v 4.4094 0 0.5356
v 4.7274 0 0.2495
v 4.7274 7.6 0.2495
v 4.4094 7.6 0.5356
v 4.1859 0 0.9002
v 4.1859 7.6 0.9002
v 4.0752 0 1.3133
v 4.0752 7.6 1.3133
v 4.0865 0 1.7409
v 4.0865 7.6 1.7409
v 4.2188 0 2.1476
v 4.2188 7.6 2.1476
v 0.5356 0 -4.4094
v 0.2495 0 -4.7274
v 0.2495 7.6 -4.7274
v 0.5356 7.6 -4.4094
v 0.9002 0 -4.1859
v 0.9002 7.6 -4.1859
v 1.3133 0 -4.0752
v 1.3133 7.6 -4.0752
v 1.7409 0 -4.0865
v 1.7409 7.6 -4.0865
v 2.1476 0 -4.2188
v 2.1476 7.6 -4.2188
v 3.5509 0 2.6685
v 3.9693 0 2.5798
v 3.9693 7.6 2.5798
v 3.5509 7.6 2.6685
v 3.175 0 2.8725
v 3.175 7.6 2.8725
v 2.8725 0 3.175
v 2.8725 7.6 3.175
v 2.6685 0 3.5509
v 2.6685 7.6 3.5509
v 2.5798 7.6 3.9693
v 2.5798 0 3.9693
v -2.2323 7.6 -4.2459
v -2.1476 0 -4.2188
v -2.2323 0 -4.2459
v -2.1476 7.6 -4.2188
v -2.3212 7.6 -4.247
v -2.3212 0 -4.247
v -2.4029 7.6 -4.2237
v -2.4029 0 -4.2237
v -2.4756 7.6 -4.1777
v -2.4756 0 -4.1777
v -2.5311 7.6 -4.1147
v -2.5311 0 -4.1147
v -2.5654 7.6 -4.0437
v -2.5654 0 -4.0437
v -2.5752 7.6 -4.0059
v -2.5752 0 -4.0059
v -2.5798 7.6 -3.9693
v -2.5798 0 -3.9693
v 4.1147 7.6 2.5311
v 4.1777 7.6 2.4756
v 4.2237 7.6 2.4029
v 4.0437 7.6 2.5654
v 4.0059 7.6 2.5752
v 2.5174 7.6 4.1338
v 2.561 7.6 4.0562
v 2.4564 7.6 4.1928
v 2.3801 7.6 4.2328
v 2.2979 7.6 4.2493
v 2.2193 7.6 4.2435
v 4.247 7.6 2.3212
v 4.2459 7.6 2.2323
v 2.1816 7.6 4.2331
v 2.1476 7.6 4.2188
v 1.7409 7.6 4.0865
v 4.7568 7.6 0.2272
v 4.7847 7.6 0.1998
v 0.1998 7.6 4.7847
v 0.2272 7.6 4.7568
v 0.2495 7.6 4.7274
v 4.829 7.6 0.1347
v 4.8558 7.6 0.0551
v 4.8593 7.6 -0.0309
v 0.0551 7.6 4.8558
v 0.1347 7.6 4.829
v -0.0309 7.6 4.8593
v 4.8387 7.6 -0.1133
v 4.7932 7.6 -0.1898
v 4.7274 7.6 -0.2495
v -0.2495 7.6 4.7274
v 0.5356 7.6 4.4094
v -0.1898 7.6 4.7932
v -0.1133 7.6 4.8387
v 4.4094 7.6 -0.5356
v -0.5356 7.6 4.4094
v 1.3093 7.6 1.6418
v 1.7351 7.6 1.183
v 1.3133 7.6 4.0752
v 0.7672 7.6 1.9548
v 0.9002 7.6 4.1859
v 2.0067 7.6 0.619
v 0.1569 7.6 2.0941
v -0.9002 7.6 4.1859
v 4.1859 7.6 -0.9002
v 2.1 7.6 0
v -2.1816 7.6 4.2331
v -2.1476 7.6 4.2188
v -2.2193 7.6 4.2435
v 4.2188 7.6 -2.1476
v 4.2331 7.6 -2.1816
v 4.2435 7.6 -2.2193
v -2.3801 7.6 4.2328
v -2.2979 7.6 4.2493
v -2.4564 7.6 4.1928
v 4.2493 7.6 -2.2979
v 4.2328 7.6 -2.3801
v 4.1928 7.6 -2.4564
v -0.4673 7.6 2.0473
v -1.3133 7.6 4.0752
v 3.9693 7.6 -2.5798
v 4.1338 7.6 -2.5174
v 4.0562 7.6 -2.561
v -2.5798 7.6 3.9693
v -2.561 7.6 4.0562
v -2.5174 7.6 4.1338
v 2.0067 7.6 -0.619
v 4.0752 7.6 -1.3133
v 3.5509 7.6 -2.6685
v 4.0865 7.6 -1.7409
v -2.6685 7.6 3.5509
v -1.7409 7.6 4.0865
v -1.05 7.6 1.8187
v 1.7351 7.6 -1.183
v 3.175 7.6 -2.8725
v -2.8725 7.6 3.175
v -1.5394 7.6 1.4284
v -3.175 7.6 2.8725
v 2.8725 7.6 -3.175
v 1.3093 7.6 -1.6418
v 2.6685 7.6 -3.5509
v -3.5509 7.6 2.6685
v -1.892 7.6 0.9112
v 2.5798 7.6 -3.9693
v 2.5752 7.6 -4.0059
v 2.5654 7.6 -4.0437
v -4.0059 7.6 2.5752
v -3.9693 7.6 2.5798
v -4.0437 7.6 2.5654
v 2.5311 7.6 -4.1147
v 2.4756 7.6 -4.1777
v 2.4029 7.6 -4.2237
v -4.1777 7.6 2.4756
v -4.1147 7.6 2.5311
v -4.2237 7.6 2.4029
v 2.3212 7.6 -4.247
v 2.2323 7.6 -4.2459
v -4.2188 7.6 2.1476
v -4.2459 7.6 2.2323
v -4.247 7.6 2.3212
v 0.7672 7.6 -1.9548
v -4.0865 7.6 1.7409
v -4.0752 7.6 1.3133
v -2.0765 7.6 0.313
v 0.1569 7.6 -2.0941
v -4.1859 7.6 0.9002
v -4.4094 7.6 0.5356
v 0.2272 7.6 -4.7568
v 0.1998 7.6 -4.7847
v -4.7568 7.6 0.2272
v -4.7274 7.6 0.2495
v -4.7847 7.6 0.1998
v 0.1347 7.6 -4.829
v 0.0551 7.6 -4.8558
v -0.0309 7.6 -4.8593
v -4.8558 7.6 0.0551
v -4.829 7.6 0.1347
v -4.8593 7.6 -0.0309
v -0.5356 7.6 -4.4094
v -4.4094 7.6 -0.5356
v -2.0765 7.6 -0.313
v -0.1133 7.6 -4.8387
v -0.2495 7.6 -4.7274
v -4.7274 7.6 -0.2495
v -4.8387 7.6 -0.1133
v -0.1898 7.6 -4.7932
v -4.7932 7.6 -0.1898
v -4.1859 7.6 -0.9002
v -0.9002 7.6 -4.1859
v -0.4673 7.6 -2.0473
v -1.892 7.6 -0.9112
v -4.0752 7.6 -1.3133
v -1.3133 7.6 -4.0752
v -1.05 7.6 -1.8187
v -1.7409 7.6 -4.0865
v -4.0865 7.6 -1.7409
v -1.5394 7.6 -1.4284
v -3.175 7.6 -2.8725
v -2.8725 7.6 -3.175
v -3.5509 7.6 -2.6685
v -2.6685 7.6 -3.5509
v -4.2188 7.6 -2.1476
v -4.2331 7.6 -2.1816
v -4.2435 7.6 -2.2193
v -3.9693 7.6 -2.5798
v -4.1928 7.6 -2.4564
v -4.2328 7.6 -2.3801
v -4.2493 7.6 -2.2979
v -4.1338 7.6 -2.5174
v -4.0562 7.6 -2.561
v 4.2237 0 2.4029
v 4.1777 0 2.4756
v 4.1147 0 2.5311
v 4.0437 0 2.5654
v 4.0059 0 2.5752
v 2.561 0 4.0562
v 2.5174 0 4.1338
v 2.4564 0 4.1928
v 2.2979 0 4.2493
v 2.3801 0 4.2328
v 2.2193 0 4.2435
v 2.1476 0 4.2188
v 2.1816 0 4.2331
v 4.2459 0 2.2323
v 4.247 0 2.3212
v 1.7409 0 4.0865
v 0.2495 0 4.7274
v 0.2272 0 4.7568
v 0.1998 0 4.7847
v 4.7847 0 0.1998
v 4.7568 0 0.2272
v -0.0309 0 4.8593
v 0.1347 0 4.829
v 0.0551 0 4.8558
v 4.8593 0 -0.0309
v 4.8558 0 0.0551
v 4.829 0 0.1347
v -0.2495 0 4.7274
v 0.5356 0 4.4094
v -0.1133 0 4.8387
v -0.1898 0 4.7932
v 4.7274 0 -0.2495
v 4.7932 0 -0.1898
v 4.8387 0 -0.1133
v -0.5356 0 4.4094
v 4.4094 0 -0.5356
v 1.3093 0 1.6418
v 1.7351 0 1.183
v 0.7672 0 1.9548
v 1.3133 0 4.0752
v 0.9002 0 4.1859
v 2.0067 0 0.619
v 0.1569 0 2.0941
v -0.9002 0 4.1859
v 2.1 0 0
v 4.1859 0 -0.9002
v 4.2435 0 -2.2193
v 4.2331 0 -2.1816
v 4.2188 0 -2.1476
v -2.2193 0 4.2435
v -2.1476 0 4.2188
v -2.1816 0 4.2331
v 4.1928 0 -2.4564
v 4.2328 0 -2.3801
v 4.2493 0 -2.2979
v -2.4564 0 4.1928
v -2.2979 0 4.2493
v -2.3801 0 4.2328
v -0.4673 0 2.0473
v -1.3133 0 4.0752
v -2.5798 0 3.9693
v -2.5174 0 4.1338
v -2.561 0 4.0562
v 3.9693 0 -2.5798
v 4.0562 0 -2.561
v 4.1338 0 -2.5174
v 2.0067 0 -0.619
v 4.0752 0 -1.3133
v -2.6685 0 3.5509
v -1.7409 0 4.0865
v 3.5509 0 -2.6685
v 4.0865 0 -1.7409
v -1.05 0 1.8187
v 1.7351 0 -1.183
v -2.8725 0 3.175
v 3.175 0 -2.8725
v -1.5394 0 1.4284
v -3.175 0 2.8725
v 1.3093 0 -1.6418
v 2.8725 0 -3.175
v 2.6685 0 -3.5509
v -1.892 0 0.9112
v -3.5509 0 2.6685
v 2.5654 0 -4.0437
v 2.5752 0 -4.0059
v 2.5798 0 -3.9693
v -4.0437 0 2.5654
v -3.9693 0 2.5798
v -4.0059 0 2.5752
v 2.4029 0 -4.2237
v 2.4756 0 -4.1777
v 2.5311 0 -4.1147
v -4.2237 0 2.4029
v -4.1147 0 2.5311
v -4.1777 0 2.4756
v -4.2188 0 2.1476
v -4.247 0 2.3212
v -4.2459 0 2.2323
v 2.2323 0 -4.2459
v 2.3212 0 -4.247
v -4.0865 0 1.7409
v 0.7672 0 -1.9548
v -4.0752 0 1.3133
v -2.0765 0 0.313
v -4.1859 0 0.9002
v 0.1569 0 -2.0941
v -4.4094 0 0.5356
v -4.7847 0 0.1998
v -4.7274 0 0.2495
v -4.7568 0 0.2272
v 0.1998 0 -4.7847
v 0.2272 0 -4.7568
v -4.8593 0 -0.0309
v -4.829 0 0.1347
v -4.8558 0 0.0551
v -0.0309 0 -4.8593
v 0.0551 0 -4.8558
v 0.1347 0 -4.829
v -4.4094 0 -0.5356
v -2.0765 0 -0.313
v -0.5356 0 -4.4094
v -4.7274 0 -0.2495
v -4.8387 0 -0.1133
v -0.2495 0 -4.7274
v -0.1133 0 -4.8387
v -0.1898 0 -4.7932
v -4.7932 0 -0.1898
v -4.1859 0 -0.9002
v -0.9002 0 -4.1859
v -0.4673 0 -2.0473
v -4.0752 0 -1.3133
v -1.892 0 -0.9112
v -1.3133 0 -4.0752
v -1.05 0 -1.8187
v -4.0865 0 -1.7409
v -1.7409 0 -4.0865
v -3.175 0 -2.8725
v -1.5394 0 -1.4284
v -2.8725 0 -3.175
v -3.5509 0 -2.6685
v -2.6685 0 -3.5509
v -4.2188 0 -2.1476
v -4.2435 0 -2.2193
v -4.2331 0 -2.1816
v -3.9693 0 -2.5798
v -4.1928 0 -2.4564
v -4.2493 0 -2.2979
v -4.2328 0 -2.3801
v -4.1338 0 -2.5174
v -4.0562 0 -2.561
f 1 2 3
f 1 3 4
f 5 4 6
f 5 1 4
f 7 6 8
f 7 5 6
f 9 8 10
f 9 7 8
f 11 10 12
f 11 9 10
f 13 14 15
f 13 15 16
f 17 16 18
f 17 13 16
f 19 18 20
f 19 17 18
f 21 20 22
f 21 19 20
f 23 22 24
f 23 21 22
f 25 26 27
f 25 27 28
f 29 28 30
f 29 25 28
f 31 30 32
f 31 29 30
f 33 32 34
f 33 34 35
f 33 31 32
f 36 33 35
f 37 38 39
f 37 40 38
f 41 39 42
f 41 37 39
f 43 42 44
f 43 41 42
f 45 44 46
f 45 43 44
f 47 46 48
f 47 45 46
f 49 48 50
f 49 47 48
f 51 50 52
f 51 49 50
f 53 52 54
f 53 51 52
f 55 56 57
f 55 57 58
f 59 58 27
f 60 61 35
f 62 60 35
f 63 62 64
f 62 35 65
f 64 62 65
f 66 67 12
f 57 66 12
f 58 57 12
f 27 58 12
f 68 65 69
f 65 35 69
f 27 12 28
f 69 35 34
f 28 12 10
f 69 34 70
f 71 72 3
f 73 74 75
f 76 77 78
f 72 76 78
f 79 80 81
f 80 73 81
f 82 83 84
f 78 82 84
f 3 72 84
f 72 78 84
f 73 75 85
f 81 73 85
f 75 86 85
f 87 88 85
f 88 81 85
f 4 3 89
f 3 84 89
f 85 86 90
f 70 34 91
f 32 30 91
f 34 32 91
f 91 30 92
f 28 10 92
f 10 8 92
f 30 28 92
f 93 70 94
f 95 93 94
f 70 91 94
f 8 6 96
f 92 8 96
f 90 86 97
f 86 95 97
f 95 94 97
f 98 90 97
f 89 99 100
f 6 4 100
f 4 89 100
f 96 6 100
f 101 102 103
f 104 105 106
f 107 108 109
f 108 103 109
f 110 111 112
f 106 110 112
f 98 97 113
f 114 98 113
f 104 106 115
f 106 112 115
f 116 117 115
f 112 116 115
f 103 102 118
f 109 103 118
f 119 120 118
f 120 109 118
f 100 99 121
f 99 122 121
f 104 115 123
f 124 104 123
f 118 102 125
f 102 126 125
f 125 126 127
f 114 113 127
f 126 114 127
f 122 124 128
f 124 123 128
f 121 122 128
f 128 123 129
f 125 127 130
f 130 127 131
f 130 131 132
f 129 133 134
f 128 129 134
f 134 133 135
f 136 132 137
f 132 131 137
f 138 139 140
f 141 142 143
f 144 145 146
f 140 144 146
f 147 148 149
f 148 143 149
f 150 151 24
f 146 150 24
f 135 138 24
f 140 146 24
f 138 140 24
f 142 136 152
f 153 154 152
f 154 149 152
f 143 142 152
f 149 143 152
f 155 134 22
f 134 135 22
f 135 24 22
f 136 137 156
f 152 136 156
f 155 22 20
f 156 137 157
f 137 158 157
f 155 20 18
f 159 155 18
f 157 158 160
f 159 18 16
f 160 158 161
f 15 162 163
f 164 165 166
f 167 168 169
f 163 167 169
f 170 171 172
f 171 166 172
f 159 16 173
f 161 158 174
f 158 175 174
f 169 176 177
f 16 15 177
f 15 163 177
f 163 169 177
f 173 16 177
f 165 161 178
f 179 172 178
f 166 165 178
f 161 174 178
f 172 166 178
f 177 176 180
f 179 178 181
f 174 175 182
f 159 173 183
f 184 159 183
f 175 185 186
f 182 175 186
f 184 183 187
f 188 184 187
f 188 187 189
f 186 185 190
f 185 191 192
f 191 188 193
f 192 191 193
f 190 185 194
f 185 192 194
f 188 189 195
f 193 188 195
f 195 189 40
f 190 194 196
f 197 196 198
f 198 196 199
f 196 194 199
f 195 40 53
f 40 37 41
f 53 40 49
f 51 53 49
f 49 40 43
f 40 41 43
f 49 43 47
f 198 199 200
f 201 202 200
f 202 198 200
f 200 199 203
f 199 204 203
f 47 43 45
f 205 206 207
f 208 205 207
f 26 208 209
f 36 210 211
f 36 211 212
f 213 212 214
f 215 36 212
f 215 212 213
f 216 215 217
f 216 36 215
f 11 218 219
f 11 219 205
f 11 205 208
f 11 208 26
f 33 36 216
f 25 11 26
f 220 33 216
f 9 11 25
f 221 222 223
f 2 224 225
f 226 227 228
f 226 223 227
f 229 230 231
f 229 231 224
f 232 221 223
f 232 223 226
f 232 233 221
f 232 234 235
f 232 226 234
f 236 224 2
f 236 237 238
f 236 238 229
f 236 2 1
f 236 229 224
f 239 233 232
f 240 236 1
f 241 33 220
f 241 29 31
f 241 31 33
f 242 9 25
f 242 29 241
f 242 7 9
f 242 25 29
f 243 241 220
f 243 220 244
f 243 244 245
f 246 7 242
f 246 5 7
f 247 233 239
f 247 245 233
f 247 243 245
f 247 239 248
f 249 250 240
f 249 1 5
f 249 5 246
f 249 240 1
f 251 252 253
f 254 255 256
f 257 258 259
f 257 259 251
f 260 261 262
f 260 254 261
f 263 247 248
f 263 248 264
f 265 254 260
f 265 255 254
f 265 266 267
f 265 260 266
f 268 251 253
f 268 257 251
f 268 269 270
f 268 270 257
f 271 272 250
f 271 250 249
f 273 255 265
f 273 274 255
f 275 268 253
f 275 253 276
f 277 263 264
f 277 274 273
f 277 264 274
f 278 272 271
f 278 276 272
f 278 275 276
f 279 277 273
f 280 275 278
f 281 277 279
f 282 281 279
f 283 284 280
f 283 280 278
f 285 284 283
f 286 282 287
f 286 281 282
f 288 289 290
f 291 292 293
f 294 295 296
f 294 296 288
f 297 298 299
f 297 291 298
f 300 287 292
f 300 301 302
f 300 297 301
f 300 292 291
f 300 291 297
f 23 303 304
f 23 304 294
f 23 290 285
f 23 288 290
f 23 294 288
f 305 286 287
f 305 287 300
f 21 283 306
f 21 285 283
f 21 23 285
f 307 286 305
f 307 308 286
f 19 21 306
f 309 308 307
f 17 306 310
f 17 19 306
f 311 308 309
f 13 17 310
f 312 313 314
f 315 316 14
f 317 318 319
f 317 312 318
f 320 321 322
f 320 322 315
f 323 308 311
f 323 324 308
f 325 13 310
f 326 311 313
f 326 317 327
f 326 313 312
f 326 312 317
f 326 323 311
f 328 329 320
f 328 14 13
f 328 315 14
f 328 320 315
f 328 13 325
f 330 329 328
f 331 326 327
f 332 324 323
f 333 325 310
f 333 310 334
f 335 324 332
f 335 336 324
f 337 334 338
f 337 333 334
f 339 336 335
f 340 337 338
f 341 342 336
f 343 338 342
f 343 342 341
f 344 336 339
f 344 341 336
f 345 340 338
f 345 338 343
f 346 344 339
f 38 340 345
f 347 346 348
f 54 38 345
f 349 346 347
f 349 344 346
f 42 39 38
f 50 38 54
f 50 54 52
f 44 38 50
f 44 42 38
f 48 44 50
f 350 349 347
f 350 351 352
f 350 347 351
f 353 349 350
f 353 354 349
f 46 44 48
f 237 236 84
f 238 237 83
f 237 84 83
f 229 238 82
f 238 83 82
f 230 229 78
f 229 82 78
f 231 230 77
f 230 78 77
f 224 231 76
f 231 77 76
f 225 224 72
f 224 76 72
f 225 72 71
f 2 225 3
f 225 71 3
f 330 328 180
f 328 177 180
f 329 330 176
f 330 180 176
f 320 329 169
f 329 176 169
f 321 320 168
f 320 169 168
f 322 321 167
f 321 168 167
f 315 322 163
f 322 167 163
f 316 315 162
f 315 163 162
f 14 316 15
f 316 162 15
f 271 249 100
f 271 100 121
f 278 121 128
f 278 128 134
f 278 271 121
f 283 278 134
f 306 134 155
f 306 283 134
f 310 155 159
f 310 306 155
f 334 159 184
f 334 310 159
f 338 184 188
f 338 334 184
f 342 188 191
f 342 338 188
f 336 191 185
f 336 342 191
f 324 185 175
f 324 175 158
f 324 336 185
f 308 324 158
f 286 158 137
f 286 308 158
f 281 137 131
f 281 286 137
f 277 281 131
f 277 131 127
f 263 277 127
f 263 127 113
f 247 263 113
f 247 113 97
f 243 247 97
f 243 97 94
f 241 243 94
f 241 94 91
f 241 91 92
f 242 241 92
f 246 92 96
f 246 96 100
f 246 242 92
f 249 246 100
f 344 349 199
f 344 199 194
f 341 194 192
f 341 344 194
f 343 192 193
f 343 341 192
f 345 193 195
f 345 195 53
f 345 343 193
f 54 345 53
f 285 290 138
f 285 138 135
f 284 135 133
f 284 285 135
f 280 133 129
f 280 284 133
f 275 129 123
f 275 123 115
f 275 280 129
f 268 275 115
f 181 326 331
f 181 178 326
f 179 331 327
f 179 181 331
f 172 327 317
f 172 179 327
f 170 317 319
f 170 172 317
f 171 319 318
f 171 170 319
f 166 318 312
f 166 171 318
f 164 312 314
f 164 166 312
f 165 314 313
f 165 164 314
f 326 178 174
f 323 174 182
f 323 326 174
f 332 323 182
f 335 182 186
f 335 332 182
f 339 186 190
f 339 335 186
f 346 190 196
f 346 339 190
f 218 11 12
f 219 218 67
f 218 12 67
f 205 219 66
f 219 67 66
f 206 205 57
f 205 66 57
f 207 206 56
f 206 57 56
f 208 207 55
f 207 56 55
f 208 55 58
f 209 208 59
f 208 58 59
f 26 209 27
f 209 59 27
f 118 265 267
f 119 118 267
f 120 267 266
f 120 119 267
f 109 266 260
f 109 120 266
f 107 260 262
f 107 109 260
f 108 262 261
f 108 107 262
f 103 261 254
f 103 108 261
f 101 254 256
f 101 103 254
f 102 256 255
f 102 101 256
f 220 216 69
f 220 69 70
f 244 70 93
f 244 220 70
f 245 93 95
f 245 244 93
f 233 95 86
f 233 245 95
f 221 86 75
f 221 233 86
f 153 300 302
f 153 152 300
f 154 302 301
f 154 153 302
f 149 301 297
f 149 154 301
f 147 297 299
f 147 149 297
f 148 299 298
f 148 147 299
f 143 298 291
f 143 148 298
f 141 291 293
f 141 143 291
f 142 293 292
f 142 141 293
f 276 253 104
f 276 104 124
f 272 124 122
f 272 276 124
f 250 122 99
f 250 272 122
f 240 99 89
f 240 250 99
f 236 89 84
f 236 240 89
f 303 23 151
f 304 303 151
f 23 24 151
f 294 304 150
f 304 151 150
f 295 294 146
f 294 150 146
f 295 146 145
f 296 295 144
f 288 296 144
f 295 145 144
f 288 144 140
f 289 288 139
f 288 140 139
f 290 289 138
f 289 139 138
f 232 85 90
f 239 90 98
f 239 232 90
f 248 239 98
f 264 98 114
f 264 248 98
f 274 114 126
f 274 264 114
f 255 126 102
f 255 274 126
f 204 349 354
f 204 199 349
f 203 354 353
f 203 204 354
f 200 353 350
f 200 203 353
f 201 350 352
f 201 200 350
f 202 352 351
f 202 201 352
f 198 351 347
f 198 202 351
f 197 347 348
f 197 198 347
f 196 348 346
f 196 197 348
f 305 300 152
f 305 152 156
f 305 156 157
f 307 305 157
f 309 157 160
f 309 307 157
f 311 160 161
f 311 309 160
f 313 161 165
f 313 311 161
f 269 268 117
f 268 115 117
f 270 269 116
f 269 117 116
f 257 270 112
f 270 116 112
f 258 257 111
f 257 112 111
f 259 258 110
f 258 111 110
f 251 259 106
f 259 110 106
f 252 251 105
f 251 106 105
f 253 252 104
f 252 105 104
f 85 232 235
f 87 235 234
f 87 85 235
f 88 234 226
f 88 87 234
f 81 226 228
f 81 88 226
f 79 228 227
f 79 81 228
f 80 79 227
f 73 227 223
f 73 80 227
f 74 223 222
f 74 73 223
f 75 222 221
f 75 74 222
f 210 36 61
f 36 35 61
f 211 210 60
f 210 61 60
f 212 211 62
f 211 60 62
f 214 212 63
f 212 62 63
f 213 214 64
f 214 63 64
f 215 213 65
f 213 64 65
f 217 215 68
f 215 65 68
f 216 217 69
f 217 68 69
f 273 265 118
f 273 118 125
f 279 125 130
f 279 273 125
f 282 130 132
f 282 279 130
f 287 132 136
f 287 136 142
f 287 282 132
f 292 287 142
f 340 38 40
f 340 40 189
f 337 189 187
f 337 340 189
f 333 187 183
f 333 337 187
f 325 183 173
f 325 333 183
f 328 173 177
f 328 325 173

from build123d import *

# Parameters (mm, degrees)
SKETCH_1_R      = 2.1
EXTRUDE_1_DEPTH = 7.6
FILLET_1_R      = 0.3


with BuildPart() as part:
    # 草图1 → 凸台-拉伸1 (new body)
    with BuildSketch(Plane(origin=(0, 0, 0), x_dir=(1, 0, 0), z_dir=(0, 1, 0))):
        with BuildLine():
            ThreePointArc((-2.75, 4.763139721), (-1.102778373, 4.115624918), (0, 5.5))
            ThreePointArc((0, 5.5), (1.102778373, 4.115624918), (2.75, 4.763139721))
            ThreePointArc((2.75, 4.763139721), (3.012846545, 3.012846545), (4.763139721, 2.75))
            ThreePointArc((4.763139721, 2.75), (4.115624918, 1.102778373), (5.5, 0))
            ThreePointArc((5.5, 0), (4.115624918, -1.102778373), (4.763139721, -2.75))
            ThreePointArc((4.763139721, -2.75), (3.012846545, -3.012846545), (2.75, -4.763139721))
            ThreePointArc((2.75, -4.763139721), (1.102778373, -4.115624918), (0, -5.5))
            ThreePointArc((0, -5.5), (-1.102778373, -4.115624918), (-2.75, -4.763139721))
            ThreePointArc((-2.75, -4.763139721), (-3.012846545, -3.012846545), (-4.763139721, -2.75))
            ThreePointArc((-4.763139721, -2.75), (-4.115624918, -1.102778373), (-5.5, 0))
            ThreePointArc((-5.5, 0), (-4.115624918, 1.102778373), (-4.763139721, 2.75))
            ThreePointArc((-4.763139721, 2.75), (-3.012846545, 3.012846545), (-2.75, 4.763139721))
        make_face()
        Circle(SKETCH_1_R, mode=Mode.SUBTRACT)
    extrude(amount=EXTRUDE_1_DEPTH)

    # 圆角1
    fillet_1_edges = [part.edges().sort_by_distance(p)[0] for p in [
        (-2.75, 3.8, -4.763139721),
        (0, 3.8, -5.5),
        (2.75, 3.8, -4.763139721),
        (4.763139721, 3.8, -2.75),
        (5.5, 3.8, 0),
        (4.763139721, 3.8, 2.75),
        (2.75, 3.8, 4.763139721),
        (0, 3.8, 5.5),
        (-2.75, 3.8, 4.763139721),
        (-4.763139721, 3.8, 2.75),
        (-5.5, 3.8, 0),
        (-4.763139721, 3.8, -2.75),
    ]]
    fillet(fillet_1_edges, radius=FILLET_1_R)


solid = part.part
